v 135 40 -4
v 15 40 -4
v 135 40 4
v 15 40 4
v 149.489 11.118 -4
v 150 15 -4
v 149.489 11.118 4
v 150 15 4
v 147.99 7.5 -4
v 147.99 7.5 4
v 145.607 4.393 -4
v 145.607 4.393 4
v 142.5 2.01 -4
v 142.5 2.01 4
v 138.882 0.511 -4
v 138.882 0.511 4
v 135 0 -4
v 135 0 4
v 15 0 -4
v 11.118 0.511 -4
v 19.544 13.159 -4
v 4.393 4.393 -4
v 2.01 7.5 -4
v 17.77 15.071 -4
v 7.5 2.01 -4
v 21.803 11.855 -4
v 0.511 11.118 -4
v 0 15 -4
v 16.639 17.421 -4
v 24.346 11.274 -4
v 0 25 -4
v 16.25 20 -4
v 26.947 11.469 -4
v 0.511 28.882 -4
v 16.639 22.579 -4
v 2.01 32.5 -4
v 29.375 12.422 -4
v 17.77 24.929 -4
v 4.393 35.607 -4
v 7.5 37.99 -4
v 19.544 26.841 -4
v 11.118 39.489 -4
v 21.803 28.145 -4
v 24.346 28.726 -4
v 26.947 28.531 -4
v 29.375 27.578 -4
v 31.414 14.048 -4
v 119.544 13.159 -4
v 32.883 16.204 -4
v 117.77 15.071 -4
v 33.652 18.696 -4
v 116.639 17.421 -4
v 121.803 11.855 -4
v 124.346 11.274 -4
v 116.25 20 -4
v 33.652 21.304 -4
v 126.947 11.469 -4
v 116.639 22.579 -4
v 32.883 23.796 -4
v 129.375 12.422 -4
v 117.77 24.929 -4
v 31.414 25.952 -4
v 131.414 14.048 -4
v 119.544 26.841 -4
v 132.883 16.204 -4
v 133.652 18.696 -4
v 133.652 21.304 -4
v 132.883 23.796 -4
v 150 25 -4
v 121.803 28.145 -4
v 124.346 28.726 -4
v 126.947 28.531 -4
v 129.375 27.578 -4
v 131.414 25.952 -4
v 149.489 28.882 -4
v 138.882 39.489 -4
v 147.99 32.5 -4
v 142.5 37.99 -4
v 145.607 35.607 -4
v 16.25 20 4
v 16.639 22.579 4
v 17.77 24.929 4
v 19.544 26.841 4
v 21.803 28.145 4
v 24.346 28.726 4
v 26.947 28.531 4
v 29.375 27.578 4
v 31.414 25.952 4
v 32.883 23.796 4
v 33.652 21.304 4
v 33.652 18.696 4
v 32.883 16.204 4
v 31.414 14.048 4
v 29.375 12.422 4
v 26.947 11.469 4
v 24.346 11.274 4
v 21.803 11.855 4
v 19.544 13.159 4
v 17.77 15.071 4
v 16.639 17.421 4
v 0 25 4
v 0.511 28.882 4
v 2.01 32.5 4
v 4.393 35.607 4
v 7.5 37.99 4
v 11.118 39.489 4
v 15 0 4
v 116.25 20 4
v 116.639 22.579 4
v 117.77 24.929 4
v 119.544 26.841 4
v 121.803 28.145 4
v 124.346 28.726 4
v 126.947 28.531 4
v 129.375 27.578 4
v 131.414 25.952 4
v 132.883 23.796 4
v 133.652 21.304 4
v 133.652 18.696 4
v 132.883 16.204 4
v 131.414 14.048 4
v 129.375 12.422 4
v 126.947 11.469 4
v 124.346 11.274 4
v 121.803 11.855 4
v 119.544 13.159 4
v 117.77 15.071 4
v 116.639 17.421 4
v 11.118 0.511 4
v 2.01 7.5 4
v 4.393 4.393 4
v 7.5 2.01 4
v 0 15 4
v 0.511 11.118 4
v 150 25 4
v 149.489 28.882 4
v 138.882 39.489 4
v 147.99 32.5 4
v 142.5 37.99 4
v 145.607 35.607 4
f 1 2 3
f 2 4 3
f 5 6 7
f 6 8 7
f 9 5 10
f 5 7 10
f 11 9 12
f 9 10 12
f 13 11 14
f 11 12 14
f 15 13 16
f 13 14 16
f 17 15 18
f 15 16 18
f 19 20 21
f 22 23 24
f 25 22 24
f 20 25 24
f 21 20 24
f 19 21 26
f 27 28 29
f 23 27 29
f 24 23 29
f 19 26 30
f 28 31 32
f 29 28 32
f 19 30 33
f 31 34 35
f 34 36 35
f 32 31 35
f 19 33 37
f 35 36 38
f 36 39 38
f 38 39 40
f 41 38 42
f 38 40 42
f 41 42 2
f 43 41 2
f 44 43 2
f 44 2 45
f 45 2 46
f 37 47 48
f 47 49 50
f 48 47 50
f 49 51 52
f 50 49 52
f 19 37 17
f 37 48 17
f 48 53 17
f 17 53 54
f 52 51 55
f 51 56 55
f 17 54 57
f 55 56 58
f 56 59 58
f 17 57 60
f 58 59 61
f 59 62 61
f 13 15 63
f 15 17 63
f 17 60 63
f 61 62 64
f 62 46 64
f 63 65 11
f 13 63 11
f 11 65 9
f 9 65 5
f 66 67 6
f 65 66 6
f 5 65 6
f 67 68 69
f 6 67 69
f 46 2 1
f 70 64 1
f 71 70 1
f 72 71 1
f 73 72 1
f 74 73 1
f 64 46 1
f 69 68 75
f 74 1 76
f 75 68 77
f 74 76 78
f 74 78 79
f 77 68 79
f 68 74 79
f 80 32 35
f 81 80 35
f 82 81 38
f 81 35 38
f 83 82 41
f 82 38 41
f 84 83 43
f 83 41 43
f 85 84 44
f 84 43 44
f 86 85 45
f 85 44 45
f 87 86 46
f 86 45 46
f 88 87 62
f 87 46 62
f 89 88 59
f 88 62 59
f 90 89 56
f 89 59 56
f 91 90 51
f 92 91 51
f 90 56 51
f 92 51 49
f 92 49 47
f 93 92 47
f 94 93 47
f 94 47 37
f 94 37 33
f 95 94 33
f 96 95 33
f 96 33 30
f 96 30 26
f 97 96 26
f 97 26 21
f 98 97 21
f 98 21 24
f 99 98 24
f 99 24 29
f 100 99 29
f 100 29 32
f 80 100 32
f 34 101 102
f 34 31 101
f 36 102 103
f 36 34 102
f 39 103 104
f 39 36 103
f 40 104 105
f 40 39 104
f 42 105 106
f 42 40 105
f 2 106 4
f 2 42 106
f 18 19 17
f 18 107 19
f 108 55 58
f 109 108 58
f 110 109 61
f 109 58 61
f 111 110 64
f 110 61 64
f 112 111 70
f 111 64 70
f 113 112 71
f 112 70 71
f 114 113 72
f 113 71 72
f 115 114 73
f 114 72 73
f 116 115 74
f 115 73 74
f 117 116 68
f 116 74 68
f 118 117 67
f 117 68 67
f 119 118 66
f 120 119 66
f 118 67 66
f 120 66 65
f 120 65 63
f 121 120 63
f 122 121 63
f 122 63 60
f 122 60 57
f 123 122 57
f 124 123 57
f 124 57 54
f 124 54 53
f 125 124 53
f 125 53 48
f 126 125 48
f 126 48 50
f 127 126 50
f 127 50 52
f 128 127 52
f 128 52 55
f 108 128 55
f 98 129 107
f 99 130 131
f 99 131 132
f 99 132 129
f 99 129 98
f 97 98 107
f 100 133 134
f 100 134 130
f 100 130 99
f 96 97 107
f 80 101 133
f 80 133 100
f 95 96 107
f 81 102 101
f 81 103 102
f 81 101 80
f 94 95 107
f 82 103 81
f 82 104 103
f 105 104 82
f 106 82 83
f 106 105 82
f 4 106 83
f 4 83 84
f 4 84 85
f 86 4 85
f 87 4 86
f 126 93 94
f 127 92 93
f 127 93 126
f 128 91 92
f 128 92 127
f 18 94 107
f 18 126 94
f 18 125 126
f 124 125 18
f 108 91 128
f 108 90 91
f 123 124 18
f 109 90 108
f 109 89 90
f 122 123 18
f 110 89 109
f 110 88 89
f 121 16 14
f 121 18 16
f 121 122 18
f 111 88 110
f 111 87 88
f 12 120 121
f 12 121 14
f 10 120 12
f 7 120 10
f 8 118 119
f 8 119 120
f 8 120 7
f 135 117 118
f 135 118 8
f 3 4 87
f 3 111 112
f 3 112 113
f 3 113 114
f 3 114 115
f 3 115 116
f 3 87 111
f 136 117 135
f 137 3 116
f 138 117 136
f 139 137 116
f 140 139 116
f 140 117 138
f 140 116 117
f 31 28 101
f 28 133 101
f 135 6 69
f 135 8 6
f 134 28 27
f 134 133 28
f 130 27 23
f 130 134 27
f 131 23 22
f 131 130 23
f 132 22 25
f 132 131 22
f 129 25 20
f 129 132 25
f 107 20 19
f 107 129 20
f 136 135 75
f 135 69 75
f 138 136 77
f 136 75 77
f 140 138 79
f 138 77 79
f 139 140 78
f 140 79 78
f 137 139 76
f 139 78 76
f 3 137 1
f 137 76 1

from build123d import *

# Parameters (mm, degrees)
ESBO_O1_W                                = 150
ESBO_O1_H                                = 40
RESSALTO_EXTRUS_O1_DEPTH                 = 4
FILETE2_R                                = 15
BROCA_DE_ROSQUEAR_PARA_TARRAXA_DE_M201_D = 17.5


with BuildPart() as part:
    # Esboço1 → Ressalto-extrusão1 (new, symmetric)
    with BuildSketch(Plane.XY):
        with Locations((75, 20)):
            Rectangle(ESBO_O1_W, ESBO_O1_H)
    extrude(amount=RESSALTO_EXTRUS_O1_DEPTH, both=True)

    # Filete2
    filete2_edges = [part.edges().sort_by_distance(p)[0] for p in [
        (0, 0, 0),
        (0, 40, 0),
        (150, 40, 0),
        (150, 0, 0),
    ]]
    fillet(filete2_edges, radius=FILETE2_R)

    # Broca de rosquear para tarraxa de M201 (through all)
    with Locations(Plane.XY.offset(4)):
        with Locations((25, 20), (125, 20)):
            Hole(BROCA_DE_ROSQUEAR_PARA_TARRAXA_DE_M201_D / 2)


solid = part.part
